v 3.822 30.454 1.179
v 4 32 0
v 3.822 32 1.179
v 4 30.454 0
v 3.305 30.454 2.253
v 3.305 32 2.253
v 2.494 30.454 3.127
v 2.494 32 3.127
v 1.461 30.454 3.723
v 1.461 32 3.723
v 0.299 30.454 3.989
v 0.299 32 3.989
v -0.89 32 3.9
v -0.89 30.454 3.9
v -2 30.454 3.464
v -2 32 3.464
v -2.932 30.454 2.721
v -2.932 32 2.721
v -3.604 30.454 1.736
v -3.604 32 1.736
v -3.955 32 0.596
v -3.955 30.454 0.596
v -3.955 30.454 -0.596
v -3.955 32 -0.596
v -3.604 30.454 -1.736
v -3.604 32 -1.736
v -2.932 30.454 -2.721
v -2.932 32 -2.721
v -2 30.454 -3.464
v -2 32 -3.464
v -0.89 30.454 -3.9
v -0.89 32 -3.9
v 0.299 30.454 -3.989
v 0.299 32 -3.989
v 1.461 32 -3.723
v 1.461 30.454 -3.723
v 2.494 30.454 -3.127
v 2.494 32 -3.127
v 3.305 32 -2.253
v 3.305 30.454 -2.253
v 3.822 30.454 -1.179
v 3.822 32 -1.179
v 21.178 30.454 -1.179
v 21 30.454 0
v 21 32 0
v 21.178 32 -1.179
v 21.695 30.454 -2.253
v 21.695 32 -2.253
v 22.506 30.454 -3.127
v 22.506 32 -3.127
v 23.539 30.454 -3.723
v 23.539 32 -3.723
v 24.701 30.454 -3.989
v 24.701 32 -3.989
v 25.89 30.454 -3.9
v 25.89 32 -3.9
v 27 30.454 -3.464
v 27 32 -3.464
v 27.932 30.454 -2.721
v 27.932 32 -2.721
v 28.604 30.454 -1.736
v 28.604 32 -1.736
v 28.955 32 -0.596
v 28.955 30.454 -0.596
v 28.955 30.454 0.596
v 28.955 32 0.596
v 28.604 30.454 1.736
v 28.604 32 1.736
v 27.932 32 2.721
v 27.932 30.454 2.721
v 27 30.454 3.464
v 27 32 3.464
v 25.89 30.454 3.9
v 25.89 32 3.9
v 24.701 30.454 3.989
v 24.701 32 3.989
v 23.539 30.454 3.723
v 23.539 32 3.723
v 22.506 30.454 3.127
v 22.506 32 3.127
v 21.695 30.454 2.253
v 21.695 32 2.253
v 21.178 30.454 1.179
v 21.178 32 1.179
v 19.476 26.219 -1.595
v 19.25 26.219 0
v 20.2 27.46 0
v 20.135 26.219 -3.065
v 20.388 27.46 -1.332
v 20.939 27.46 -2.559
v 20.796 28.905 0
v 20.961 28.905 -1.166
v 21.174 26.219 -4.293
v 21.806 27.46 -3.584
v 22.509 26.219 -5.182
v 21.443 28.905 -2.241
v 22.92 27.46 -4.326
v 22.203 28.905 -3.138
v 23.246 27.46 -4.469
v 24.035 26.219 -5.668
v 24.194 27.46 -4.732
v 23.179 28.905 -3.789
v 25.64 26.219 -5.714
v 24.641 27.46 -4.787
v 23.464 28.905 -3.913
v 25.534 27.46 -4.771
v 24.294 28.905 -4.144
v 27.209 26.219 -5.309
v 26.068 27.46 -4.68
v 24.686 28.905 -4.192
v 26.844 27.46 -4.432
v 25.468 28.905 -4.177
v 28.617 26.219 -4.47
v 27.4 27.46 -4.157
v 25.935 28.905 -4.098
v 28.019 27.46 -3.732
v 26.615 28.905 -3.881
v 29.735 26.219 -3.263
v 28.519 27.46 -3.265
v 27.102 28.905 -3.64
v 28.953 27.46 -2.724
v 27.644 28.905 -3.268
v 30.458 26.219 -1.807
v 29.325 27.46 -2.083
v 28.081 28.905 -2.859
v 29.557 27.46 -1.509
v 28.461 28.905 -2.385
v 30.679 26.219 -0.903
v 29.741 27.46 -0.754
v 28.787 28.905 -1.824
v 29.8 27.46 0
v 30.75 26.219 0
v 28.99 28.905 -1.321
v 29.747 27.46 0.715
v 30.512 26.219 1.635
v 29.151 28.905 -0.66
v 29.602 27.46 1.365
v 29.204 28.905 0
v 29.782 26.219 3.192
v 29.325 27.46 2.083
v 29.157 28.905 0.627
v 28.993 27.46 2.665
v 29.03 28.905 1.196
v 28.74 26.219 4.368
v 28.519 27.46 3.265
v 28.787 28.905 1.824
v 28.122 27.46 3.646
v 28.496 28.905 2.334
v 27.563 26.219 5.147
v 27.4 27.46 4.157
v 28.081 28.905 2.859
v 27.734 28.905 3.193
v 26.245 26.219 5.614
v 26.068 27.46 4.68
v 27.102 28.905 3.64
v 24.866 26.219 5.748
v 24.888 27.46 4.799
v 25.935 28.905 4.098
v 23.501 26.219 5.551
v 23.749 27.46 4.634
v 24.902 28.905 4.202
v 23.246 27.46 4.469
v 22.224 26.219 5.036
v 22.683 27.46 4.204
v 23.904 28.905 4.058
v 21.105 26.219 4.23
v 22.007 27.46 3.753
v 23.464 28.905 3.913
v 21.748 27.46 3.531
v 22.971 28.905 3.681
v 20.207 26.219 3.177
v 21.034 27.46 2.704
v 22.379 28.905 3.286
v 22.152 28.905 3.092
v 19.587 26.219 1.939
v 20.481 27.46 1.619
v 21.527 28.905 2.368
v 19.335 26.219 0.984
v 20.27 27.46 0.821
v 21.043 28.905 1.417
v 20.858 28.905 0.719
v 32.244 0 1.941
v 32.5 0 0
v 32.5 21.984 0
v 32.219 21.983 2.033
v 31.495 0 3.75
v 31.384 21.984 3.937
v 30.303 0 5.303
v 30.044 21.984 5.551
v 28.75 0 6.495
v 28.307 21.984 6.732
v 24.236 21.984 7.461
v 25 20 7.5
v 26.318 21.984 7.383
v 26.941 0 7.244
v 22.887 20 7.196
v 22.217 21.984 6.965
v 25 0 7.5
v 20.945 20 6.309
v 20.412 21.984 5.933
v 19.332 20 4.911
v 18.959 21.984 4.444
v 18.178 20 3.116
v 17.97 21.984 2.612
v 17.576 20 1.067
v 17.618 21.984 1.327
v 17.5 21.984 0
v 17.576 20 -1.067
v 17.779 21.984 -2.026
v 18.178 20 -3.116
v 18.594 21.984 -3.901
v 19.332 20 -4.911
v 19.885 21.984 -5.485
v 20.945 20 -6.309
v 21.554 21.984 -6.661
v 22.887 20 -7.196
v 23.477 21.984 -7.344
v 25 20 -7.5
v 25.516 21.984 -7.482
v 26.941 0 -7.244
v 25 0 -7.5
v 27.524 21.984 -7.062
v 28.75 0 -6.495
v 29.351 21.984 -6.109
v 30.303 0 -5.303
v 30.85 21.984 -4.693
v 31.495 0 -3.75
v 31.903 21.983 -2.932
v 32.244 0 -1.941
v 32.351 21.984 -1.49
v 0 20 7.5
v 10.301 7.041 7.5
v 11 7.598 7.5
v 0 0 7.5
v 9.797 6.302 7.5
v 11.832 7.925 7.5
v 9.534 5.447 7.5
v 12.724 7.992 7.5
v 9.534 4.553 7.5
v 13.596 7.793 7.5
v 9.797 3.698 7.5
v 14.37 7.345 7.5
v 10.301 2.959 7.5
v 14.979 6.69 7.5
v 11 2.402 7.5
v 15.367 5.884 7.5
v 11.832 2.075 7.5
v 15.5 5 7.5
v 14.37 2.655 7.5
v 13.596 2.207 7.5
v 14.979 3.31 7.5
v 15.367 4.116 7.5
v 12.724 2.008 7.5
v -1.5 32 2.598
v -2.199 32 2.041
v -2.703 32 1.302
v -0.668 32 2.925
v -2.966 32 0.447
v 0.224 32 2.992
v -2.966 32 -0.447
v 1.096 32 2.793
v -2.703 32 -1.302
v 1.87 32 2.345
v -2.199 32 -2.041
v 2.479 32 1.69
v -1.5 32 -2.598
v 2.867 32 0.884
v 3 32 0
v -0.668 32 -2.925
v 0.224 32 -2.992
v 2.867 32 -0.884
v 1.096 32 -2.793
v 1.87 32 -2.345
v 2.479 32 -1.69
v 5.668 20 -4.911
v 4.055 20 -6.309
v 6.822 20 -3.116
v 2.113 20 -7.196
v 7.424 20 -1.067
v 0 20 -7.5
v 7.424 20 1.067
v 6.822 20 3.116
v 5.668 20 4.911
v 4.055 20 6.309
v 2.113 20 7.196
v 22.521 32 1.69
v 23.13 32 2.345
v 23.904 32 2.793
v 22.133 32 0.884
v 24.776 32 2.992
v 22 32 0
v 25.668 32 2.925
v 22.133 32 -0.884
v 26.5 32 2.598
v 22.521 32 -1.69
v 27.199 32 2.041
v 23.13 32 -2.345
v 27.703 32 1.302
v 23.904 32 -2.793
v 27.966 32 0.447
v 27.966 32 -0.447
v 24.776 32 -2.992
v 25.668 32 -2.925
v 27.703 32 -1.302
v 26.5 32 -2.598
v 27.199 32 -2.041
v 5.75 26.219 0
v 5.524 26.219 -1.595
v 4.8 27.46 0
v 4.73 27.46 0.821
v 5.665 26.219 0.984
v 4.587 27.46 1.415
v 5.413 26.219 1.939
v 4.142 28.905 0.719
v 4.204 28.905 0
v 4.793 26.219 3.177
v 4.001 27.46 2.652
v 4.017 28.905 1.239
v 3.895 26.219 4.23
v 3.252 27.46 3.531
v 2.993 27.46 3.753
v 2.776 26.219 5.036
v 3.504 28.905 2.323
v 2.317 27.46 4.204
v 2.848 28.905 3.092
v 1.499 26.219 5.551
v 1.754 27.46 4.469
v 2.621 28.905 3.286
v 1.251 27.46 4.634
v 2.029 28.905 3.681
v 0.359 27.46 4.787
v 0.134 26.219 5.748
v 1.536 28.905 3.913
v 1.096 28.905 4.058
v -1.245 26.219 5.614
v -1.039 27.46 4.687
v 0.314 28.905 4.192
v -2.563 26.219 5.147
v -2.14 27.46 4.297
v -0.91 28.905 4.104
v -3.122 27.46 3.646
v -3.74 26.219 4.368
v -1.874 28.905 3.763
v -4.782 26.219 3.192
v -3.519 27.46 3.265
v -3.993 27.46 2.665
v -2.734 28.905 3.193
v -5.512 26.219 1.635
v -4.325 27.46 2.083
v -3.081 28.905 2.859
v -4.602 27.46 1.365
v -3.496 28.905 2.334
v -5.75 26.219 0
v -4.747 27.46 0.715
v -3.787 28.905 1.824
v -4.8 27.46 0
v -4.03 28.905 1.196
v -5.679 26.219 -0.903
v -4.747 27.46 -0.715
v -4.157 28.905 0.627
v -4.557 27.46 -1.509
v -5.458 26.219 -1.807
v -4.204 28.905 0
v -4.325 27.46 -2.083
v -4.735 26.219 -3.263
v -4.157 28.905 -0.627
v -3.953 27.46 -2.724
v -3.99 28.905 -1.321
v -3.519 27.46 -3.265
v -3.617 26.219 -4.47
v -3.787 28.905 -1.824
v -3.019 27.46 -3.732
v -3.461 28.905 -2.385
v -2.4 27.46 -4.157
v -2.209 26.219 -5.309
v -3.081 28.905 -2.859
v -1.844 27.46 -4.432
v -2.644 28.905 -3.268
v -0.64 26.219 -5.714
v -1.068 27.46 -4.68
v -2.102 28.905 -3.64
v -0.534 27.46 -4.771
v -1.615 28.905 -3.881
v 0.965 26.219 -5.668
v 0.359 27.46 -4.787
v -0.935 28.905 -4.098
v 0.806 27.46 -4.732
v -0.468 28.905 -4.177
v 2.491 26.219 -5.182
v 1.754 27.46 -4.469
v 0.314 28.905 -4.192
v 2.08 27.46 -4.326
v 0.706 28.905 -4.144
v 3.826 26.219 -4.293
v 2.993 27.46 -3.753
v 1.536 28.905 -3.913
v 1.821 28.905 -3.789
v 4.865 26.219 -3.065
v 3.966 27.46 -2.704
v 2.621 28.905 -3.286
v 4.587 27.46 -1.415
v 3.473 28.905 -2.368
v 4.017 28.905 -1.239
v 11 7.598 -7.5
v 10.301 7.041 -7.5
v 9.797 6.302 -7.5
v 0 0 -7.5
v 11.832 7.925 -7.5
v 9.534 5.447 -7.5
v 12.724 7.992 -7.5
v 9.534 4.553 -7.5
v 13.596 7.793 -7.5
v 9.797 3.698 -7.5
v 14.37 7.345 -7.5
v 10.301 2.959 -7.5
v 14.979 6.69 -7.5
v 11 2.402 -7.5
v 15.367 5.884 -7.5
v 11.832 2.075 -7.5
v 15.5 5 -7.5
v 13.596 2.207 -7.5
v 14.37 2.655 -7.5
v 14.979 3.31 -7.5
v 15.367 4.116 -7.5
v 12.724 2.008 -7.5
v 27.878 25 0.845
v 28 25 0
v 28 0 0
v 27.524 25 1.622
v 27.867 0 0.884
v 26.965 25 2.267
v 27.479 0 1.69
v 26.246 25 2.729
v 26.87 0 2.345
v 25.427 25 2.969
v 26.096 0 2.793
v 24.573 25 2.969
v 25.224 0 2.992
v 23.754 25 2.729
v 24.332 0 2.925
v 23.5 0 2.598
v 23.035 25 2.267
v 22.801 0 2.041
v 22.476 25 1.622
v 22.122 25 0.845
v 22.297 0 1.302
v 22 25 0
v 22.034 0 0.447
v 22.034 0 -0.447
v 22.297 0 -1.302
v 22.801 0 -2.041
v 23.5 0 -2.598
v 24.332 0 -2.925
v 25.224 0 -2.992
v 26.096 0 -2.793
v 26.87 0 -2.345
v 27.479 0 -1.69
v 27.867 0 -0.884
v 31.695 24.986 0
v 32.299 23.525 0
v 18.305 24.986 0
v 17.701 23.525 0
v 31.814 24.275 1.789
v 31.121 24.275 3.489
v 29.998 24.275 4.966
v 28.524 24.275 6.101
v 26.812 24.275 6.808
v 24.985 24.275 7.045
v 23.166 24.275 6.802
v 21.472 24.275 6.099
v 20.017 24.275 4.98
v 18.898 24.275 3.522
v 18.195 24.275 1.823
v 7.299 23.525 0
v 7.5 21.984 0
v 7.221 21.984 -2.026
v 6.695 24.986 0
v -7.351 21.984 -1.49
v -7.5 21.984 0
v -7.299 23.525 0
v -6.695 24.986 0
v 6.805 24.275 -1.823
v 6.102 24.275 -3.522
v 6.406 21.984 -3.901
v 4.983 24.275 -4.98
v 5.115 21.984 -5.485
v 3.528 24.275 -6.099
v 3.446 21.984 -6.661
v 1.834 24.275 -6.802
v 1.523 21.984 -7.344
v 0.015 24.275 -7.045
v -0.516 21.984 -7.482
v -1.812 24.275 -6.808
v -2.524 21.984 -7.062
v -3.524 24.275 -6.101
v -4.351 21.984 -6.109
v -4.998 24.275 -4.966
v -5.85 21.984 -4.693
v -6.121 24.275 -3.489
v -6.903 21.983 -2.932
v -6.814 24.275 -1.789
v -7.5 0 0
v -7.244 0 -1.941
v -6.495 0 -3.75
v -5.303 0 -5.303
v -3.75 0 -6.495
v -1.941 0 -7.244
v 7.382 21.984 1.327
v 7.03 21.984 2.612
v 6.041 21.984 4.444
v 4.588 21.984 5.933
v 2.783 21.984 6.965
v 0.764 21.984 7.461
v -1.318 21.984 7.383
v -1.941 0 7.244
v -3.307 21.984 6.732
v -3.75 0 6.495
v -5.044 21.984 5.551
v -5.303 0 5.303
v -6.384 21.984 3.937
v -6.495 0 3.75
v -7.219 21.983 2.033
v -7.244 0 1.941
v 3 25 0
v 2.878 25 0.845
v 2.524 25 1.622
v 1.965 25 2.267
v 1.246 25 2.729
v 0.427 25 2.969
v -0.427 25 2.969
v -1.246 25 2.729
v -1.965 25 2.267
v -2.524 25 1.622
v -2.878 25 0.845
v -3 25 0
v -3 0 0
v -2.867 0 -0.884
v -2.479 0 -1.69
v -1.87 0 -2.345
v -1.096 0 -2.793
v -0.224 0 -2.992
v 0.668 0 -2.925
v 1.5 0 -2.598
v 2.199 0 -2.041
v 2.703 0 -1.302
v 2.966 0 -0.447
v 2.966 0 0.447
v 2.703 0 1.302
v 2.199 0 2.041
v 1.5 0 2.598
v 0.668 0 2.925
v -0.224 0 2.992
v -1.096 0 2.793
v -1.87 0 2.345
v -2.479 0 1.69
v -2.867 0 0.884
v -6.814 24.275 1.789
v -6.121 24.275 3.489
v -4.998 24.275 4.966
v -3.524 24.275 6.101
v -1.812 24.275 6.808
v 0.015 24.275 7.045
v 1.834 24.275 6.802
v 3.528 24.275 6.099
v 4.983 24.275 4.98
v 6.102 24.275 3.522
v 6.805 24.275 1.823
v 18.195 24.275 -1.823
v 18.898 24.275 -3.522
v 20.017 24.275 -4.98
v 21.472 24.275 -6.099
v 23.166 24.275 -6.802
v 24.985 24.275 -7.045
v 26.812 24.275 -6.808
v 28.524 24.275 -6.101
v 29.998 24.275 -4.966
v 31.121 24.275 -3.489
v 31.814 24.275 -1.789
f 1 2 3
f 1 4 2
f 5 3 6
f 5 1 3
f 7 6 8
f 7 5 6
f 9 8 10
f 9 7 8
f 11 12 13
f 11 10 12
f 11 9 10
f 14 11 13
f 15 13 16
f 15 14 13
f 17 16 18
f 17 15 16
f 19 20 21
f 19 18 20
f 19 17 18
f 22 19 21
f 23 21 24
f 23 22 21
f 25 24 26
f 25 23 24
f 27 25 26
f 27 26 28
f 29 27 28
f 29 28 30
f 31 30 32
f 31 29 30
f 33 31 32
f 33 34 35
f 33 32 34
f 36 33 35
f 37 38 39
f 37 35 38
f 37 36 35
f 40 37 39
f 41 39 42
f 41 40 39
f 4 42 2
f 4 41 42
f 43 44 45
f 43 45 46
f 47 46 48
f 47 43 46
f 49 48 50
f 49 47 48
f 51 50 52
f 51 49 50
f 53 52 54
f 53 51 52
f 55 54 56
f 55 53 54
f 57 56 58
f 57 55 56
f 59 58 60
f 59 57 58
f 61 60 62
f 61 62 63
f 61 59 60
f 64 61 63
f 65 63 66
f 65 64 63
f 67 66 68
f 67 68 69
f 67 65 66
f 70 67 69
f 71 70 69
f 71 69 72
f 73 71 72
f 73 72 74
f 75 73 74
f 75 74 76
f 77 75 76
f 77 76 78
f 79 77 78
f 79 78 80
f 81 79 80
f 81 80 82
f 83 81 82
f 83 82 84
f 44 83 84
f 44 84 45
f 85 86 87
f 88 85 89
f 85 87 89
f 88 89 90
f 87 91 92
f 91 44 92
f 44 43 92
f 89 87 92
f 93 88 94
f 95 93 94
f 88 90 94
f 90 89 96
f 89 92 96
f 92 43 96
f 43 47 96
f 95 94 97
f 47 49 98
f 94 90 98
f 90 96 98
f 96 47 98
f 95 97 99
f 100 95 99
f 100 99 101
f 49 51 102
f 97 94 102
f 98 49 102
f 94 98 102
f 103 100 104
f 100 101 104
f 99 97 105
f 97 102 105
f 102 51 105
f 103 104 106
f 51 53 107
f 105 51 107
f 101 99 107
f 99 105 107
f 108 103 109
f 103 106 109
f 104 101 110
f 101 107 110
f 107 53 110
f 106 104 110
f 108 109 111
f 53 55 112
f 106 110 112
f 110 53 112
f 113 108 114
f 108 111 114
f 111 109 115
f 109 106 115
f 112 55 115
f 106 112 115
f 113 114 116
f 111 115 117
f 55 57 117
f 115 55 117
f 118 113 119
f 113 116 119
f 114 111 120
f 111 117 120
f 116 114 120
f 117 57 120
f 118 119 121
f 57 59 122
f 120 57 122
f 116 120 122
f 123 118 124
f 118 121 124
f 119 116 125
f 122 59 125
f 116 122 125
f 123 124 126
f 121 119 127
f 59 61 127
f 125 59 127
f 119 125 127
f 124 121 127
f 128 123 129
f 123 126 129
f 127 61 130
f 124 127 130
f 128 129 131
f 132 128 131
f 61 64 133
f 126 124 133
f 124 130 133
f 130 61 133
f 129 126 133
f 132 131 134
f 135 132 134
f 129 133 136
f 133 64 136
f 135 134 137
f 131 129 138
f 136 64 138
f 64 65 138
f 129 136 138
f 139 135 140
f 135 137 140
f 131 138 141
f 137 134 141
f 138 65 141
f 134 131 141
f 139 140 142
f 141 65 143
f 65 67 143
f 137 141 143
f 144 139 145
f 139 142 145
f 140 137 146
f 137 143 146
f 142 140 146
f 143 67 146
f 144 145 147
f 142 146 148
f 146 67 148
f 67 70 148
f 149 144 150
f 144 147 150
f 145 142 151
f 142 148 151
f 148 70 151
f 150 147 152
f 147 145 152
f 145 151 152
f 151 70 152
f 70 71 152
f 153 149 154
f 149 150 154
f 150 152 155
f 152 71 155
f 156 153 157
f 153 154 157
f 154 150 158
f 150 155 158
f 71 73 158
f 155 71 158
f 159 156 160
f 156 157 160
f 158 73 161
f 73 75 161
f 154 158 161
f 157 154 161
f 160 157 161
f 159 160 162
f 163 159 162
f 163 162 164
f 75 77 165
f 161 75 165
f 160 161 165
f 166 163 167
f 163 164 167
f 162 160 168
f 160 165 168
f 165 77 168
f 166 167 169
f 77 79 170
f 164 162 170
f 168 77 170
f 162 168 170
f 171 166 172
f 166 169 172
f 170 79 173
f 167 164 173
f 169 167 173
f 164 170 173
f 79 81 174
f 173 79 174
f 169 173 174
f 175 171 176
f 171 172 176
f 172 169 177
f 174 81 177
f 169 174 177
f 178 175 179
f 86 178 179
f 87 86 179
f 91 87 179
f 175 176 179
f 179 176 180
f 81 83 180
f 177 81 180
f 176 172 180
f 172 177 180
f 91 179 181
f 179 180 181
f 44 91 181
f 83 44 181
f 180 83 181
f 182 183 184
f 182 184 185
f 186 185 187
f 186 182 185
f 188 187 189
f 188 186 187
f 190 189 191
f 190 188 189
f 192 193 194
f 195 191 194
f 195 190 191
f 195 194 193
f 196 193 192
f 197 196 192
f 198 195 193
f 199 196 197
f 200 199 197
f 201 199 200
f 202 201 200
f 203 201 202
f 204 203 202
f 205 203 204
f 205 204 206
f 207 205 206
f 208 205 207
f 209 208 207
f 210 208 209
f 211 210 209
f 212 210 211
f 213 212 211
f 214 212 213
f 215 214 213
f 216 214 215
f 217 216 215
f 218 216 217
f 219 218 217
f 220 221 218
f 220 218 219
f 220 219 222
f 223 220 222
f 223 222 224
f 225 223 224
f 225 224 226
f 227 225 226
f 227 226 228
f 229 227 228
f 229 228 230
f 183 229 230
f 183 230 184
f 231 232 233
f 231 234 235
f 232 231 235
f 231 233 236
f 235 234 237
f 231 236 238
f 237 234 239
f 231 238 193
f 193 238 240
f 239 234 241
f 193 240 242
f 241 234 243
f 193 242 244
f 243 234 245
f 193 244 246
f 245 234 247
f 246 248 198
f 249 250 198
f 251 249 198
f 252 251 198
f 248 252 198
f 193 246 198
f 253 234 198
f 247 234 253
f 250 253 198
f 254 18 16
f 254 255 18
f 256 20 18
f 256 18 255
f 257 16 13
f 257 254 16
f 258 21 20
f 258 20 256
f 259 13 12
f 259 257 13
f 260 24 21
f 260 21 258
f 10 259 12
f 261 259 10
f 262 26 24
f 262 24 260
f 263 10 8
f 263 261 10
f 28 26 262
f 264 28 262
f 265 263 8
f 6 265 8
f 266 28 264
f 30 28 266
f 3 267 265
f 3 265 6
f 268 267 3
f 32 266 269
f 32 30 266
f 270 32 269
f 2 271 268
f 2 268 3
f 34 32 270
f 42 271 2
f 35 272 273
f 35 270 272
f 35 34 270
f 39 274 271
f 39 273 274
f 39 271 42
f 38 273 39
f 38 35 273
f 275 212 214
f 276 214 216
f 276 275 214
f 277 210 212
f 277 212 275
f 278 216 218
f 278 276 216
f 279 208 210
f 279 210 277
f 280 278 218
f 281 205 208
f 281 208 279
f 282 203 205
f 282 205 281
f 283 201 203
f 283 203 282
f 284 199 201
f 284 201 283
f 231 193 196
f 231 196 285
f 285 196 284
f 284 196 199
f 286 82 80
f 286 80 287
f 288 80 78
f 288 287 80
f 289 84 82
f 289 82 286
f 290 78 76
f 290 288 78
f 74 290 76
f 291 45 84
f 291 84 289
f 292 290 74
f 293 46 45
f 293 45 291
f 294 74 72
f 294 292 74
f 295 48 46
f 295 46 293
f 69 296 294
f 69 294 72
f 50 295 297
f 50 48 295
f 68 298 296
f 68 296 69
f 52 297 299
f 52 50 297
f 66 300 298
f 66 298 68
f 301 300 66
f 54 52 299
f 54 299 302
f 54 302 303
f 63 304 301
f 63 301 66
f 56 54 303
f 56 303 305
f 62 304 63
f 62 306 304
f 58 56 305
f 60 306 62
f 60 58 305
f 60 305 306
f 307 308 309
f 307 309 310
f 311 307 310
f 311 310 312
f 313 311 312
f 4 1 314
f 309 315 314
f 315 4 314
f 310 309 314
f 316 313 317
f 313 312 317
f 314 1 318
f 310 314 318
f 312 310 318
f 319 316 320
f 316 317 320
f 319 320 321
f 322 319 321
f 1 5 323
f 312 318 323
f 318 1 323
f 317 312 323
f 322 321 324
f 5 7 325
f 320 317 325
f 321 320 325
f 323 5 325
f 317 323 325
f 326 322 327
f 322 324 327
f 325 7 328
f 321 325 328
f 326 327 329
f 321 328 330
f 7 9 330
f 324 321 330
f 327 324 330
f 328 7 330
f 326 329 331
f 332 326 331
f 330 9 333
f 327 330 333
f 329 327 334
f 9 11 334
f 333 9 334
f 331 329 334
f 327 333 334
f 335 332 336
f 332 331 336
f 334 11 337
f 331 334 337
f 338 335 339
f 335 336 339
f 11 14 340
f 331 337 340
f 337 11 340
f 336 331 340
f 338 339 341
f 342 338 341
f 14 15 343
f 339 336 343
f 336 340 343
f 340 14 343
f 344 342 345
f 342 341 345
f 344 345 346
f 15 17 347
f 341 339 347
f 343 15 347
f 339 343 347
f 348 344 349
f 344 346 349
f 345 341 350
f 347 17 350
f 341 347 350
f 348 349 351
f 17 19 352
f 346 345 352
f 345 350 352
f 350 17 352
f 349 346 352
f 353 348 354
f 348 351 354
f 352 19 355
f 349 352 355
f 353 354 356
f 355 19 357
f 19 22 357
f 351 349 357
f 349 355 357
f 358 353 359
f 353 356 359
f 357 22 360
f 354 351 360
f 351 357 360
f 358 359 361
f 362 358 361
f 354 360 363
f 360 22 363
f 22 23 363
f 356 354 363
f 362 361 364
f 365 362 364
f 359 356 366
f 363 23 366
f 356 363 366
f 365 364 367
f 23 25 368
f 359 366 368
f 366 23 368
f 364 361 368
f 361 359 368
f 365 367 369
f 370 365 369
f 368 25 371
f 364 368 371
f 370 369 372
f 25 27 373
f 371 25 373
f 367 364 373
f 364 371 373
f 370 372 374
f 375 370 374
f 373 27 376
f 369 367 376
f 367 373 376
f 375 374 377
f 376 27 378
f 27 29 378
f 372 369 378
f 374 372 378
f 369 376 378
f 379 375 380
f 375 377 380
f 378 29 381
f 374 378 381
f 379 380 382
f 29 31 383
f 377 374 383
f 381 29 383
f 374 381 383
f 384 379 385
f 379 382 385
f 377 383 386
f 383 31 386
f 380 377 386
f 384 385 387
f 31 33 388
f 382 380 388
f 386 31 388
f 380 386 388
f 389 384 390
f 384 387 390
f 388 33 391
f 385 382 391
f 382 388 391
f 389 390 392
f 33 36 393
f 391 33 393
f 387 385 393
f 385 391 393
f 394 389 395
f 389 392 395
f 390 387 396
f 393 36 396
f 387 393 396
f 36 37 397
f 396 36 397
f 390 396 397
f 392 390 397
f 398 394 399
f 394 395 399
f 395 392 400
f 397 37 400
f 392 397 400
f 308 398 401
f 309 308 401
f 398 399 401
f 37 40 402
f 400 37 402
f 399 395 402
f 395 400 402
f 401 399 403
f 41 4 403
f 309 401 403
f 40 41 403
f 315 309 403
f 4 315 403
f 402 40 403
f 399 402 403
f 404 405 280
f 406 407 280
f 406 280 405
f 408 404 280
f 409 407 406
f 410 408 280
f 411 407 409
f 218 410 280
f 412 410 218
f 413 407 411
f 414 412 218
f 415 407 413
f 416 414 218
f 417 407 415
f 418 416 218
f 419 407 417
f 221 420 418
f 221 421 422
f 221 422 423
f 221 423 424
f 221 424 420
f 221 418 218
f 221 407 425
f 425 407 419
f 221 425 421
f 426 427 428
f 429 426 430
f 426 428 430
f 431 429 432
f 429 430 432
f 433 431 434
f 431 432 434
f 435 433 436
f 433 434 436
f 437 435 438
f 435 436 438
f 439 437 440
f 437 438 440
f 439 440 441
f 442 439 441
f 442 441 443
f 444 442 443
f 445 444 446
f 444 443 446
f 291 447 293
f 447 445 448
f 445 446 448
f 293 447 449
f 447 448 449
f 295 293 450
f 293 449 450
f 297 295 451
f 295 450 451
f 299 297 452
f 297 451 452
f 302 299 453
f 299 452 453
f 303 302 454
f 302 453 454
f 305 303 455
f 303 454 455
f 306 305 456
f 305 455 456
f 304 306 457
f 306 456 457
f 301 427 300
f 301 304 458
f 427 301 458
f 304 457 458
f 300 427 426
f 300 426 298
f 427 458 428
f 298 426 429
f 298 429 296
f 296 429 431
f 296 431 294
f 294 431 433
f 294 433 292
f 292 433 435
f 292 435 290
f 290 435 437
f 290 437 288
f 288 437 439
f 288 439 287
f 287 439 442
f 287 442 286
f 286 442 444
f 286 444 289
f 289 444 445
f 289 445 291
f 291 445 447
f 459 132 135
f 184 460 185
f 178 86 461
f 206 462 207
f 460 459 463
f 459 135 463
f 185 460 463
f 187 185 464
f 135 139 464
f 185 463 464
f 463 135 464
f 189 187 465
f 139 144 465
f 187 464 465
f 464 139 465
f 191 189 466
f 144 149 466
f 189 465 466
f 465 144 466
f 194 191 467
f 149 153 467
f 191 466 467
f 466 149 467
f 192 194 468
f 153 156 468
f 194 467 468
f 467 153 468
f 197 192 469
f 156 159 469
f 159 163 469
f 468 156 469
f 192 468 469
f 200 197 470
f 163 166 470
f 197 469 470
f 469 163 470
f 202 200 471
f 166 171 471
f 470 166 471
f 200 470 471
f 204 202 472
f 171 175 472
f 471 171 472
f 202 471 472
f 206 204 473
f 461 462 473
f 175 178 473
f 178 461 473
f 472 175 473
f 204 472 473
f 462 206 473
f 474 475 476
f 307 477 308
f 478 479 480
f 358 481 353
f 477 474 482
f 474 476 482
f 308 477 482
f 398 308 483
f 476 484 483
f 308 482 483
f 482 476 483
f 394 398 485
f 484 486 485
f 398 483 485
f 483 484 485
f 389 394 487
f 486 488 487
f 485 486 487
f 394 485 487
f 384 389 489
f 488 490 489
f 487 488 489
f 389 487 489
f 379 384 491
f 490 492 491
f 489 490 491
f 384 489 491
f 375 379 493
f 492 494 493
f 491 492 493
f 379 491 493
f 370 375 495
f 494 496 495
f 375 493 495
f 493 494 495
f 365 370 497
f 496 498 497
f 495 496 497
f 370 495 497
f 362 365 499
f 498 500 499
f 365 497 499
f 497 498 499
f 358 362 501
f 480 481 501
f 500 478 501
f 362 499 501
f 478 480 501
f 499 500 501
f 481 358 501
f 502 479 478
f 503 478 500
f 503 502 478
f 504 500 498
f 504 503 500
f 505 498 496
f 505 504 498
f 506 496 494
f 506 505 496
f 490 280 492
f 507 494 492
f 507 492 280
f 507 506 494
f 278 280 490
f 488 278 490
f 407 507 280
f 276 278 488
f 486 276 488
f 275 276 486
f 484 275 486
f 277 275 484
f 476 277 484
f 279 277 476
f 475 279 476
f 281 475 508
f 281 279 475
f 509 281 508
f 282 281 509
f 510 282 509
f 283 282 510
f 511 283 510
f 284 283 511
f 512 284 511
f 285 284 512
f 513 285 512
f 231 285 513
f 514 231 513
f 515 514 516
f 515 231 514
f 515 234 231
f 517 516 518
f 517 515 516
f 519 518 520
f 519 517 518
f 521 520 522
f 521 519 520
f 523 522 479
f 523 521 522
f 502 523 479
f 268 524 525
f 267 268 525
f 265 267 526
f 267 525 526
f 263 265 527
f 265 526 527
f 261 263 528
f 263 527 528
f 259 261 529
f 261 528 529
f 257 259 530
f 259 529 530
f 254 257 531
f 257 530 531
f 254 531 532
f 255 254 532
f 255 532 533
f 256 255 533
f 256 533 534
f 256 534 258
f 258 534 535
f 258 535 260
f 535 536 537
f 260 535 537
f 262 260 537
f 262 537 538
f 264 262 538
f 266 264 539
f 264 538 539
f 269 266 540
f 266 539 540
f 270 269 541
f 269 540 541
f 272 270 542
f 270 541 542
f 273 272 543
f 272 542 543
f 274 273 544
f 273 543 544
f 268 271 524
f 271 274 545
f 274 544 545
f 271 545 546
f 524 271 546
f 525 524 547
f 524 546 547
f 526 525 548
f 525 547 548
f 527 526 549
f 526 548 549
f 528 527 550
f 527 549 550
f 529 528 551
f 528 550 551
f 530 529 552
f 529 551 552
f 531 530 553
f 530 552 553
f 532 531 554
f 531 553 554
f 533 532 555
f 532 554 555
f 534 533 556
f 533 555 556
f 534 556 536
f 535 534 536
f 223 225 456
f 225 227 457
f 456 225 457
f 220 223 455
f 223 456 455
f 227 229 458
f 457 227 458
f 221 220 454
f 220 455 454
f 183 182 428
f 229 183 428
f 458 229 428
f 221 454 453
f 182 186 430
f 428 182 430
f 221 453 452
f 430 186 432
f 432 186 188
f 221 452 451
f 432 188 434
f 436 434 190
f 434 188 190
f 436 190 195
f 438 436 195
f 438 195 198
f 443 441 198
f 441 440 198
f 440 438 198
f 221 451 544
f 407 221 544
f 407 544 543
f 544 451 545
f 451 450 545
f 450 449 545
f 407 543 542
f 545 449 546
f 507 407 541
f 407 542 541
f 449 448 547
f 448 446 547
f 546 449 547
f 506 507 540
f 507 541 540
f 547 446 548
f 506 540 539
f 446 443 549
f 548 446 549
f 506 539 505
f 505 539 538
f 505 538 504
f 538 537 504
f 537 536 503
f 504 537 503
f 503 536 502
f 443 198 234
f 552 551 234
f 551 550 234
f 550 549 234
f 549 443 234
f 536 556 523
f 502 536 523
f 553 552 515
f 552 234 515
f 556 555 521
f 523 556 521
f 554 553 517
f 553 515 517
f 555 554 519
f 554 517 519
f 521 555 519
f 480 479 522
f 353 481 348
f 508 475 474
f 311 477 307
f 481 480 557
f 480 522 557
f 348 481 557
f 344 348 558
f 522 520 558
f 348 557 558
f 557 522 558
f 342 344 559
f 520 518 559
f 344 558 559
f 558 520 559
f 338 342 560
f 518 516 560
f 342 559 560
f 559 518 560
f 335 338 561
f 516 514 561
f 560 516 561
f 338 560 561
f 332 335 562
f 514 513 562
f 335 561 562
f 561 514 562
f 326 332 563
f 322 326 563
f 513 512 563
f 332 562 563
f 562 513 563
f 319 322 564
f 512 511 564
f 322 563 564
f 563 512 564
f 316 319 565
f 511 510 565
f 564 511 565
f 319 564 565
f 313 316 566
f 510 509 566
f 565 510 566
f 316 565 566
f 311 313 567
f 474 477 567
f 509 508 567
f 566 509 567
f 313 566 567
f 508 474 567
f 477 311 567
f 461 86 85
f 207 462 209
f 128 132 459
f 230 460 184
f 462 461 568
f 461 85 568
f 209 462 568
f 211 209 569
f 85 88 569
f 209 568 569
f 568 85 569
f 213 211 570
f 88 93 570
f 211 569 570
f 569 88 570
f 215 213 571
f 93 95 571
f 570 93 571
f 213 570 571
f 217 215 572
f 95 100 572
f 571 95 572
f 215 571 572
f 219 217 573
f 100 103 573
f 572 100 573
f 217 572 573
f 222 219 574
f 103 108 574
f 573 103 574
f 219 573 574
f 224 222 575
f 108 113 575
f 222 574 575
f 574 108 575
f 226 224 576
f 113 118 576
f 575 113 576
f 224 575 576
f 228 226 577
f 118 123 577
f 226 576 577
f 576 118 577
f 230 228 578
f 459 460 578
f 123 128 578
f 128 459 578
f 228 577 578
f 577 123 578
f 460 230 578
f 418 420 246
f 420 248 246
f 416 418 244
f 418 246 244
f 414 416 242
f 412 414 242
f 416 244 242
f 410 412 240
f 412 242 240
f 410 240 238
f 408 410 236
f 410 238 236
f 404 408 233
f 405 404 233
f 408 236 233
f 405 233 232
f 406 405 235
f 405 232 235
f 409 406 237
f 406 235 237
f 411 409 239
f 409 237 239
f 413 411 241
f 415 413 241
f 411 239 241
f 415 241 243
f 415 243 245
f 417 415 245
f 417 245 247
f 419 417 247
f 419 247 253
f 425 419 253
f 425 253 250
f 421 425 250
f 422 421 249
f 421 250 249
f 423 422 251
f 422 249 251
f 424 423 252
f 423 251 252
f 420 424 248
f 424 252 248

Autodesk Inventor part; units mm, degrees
ref_plane "XZ Plane" through (0, 0, 0) normal (0, 1, 0) x (-1, 0, 0)
ref_plane "XY Plane" through (0, 0, 0) normal (0, 0, 1) x (1, 0, 0)
sketch "Sketch1" plane through (0, 0, 0) normal (0, 1, 0) x (-1, 0, 0)
  circle A0 centre (0, 0) radius 7.5
  circle A1 centre (0, 0) radius 3
  dimension "d0" = 15
  dimension "d1" = 6
extrude "Extrusion1" add sketch "Sketch1" along normal blind 25
sketch "Sketch2" plane through (0, 25, 0) normal (0, 1, 0) x (1, 0, 0)
  circle A0 centre (0, 0) radius 3 projected
  circle A1 centre (0, 0) radius 2.75
  circle A2 centre (0, 0) radius 4
  dimension "d4" = 5.5
  dimension "d5" = 8
extrude "Extrusion2" add sketch "Sketch2" along normal blind 7 contours A2
fillet "Fillet1" radius 6 1 edges at (-4, 25, 0)
fillet "Fillet2" radius 6 2 edges at (0, 25, -7.5) (0, 25, 7.5)
ref_plane "Work Plane1" through (12.5, 0, 0) normal (1, 0, 0) x (0, 1, 0)
mirror "Mirror1" about plane through (12.5, 0, 0) normal (1, 0, 0) of "Extrusion1", "Extrusion2", "Fillet1", "Fillet2"
sketch "Sketch3" plane through (0, 0, 0) normal (0, 1, 0) x (-1, 0, 0)
  circle A0 centre (-25, 0) radius 3 projected
  line L0 (-25, 0) -> (-25, 3)
  line L1 (-25, 0) -> (-25, -3)
  line L2 (0, 0) -> (0, -3)
  circle A1 centre (0, 0) radius 3 projected
  line L3 (0, 0) -> (0, 3)
  line L4 (-25, 3) -> (0, 3)
  line L5 (0, 3) -> (0, 7.5)
  line L6 (0, 7.5) -> (-25, 7.5)
  line L7 (-25, 7.5) -> (-25, 3)
  line L8 (-25, -3) -> (0, -3)
  line L9 (0, -3) -> (0, -7.5)
  line L10 (0, -7.5) -> (-25, -7.5)
  line L11 (-25, -7.5) -> (-25, -3)
  point P0 (0, -3)
  point P1 (0, 3)
  dimension "d11" = 25
  dimension "d12" = 4.5
  dimension "d13" = 25
  dimension "d14" = 4.5
extrude "Extrusion3" add sketch "Sketch3" along normal blind 20 contours A0 L4 A1 L8 | L7 L6 L5 L4 | L8 L9 L10 L11
sketch "Sketch4" plane through (0, 0, 7.5) normal (0, 0, 1) x (1, 0, 0)
  line L0 (25, 20) -> (0, 20) projected
  circle A0 centre (12.5, 5) radius 3
  line L1 (0, 0) -> (25, 0) projected
  line L2 (0, 0) -> (0, 20) projected
  point P0 (25, 15)
  point P1 (0, 15)
  dimension "d18" = 6
  dimension "d21" = 5
  dimension "d22" = 12.5
extrude "Extrusion4" cut sketch "Sketch4" against normal through all
properties part number "4mm_Roller_Spacer_full"
